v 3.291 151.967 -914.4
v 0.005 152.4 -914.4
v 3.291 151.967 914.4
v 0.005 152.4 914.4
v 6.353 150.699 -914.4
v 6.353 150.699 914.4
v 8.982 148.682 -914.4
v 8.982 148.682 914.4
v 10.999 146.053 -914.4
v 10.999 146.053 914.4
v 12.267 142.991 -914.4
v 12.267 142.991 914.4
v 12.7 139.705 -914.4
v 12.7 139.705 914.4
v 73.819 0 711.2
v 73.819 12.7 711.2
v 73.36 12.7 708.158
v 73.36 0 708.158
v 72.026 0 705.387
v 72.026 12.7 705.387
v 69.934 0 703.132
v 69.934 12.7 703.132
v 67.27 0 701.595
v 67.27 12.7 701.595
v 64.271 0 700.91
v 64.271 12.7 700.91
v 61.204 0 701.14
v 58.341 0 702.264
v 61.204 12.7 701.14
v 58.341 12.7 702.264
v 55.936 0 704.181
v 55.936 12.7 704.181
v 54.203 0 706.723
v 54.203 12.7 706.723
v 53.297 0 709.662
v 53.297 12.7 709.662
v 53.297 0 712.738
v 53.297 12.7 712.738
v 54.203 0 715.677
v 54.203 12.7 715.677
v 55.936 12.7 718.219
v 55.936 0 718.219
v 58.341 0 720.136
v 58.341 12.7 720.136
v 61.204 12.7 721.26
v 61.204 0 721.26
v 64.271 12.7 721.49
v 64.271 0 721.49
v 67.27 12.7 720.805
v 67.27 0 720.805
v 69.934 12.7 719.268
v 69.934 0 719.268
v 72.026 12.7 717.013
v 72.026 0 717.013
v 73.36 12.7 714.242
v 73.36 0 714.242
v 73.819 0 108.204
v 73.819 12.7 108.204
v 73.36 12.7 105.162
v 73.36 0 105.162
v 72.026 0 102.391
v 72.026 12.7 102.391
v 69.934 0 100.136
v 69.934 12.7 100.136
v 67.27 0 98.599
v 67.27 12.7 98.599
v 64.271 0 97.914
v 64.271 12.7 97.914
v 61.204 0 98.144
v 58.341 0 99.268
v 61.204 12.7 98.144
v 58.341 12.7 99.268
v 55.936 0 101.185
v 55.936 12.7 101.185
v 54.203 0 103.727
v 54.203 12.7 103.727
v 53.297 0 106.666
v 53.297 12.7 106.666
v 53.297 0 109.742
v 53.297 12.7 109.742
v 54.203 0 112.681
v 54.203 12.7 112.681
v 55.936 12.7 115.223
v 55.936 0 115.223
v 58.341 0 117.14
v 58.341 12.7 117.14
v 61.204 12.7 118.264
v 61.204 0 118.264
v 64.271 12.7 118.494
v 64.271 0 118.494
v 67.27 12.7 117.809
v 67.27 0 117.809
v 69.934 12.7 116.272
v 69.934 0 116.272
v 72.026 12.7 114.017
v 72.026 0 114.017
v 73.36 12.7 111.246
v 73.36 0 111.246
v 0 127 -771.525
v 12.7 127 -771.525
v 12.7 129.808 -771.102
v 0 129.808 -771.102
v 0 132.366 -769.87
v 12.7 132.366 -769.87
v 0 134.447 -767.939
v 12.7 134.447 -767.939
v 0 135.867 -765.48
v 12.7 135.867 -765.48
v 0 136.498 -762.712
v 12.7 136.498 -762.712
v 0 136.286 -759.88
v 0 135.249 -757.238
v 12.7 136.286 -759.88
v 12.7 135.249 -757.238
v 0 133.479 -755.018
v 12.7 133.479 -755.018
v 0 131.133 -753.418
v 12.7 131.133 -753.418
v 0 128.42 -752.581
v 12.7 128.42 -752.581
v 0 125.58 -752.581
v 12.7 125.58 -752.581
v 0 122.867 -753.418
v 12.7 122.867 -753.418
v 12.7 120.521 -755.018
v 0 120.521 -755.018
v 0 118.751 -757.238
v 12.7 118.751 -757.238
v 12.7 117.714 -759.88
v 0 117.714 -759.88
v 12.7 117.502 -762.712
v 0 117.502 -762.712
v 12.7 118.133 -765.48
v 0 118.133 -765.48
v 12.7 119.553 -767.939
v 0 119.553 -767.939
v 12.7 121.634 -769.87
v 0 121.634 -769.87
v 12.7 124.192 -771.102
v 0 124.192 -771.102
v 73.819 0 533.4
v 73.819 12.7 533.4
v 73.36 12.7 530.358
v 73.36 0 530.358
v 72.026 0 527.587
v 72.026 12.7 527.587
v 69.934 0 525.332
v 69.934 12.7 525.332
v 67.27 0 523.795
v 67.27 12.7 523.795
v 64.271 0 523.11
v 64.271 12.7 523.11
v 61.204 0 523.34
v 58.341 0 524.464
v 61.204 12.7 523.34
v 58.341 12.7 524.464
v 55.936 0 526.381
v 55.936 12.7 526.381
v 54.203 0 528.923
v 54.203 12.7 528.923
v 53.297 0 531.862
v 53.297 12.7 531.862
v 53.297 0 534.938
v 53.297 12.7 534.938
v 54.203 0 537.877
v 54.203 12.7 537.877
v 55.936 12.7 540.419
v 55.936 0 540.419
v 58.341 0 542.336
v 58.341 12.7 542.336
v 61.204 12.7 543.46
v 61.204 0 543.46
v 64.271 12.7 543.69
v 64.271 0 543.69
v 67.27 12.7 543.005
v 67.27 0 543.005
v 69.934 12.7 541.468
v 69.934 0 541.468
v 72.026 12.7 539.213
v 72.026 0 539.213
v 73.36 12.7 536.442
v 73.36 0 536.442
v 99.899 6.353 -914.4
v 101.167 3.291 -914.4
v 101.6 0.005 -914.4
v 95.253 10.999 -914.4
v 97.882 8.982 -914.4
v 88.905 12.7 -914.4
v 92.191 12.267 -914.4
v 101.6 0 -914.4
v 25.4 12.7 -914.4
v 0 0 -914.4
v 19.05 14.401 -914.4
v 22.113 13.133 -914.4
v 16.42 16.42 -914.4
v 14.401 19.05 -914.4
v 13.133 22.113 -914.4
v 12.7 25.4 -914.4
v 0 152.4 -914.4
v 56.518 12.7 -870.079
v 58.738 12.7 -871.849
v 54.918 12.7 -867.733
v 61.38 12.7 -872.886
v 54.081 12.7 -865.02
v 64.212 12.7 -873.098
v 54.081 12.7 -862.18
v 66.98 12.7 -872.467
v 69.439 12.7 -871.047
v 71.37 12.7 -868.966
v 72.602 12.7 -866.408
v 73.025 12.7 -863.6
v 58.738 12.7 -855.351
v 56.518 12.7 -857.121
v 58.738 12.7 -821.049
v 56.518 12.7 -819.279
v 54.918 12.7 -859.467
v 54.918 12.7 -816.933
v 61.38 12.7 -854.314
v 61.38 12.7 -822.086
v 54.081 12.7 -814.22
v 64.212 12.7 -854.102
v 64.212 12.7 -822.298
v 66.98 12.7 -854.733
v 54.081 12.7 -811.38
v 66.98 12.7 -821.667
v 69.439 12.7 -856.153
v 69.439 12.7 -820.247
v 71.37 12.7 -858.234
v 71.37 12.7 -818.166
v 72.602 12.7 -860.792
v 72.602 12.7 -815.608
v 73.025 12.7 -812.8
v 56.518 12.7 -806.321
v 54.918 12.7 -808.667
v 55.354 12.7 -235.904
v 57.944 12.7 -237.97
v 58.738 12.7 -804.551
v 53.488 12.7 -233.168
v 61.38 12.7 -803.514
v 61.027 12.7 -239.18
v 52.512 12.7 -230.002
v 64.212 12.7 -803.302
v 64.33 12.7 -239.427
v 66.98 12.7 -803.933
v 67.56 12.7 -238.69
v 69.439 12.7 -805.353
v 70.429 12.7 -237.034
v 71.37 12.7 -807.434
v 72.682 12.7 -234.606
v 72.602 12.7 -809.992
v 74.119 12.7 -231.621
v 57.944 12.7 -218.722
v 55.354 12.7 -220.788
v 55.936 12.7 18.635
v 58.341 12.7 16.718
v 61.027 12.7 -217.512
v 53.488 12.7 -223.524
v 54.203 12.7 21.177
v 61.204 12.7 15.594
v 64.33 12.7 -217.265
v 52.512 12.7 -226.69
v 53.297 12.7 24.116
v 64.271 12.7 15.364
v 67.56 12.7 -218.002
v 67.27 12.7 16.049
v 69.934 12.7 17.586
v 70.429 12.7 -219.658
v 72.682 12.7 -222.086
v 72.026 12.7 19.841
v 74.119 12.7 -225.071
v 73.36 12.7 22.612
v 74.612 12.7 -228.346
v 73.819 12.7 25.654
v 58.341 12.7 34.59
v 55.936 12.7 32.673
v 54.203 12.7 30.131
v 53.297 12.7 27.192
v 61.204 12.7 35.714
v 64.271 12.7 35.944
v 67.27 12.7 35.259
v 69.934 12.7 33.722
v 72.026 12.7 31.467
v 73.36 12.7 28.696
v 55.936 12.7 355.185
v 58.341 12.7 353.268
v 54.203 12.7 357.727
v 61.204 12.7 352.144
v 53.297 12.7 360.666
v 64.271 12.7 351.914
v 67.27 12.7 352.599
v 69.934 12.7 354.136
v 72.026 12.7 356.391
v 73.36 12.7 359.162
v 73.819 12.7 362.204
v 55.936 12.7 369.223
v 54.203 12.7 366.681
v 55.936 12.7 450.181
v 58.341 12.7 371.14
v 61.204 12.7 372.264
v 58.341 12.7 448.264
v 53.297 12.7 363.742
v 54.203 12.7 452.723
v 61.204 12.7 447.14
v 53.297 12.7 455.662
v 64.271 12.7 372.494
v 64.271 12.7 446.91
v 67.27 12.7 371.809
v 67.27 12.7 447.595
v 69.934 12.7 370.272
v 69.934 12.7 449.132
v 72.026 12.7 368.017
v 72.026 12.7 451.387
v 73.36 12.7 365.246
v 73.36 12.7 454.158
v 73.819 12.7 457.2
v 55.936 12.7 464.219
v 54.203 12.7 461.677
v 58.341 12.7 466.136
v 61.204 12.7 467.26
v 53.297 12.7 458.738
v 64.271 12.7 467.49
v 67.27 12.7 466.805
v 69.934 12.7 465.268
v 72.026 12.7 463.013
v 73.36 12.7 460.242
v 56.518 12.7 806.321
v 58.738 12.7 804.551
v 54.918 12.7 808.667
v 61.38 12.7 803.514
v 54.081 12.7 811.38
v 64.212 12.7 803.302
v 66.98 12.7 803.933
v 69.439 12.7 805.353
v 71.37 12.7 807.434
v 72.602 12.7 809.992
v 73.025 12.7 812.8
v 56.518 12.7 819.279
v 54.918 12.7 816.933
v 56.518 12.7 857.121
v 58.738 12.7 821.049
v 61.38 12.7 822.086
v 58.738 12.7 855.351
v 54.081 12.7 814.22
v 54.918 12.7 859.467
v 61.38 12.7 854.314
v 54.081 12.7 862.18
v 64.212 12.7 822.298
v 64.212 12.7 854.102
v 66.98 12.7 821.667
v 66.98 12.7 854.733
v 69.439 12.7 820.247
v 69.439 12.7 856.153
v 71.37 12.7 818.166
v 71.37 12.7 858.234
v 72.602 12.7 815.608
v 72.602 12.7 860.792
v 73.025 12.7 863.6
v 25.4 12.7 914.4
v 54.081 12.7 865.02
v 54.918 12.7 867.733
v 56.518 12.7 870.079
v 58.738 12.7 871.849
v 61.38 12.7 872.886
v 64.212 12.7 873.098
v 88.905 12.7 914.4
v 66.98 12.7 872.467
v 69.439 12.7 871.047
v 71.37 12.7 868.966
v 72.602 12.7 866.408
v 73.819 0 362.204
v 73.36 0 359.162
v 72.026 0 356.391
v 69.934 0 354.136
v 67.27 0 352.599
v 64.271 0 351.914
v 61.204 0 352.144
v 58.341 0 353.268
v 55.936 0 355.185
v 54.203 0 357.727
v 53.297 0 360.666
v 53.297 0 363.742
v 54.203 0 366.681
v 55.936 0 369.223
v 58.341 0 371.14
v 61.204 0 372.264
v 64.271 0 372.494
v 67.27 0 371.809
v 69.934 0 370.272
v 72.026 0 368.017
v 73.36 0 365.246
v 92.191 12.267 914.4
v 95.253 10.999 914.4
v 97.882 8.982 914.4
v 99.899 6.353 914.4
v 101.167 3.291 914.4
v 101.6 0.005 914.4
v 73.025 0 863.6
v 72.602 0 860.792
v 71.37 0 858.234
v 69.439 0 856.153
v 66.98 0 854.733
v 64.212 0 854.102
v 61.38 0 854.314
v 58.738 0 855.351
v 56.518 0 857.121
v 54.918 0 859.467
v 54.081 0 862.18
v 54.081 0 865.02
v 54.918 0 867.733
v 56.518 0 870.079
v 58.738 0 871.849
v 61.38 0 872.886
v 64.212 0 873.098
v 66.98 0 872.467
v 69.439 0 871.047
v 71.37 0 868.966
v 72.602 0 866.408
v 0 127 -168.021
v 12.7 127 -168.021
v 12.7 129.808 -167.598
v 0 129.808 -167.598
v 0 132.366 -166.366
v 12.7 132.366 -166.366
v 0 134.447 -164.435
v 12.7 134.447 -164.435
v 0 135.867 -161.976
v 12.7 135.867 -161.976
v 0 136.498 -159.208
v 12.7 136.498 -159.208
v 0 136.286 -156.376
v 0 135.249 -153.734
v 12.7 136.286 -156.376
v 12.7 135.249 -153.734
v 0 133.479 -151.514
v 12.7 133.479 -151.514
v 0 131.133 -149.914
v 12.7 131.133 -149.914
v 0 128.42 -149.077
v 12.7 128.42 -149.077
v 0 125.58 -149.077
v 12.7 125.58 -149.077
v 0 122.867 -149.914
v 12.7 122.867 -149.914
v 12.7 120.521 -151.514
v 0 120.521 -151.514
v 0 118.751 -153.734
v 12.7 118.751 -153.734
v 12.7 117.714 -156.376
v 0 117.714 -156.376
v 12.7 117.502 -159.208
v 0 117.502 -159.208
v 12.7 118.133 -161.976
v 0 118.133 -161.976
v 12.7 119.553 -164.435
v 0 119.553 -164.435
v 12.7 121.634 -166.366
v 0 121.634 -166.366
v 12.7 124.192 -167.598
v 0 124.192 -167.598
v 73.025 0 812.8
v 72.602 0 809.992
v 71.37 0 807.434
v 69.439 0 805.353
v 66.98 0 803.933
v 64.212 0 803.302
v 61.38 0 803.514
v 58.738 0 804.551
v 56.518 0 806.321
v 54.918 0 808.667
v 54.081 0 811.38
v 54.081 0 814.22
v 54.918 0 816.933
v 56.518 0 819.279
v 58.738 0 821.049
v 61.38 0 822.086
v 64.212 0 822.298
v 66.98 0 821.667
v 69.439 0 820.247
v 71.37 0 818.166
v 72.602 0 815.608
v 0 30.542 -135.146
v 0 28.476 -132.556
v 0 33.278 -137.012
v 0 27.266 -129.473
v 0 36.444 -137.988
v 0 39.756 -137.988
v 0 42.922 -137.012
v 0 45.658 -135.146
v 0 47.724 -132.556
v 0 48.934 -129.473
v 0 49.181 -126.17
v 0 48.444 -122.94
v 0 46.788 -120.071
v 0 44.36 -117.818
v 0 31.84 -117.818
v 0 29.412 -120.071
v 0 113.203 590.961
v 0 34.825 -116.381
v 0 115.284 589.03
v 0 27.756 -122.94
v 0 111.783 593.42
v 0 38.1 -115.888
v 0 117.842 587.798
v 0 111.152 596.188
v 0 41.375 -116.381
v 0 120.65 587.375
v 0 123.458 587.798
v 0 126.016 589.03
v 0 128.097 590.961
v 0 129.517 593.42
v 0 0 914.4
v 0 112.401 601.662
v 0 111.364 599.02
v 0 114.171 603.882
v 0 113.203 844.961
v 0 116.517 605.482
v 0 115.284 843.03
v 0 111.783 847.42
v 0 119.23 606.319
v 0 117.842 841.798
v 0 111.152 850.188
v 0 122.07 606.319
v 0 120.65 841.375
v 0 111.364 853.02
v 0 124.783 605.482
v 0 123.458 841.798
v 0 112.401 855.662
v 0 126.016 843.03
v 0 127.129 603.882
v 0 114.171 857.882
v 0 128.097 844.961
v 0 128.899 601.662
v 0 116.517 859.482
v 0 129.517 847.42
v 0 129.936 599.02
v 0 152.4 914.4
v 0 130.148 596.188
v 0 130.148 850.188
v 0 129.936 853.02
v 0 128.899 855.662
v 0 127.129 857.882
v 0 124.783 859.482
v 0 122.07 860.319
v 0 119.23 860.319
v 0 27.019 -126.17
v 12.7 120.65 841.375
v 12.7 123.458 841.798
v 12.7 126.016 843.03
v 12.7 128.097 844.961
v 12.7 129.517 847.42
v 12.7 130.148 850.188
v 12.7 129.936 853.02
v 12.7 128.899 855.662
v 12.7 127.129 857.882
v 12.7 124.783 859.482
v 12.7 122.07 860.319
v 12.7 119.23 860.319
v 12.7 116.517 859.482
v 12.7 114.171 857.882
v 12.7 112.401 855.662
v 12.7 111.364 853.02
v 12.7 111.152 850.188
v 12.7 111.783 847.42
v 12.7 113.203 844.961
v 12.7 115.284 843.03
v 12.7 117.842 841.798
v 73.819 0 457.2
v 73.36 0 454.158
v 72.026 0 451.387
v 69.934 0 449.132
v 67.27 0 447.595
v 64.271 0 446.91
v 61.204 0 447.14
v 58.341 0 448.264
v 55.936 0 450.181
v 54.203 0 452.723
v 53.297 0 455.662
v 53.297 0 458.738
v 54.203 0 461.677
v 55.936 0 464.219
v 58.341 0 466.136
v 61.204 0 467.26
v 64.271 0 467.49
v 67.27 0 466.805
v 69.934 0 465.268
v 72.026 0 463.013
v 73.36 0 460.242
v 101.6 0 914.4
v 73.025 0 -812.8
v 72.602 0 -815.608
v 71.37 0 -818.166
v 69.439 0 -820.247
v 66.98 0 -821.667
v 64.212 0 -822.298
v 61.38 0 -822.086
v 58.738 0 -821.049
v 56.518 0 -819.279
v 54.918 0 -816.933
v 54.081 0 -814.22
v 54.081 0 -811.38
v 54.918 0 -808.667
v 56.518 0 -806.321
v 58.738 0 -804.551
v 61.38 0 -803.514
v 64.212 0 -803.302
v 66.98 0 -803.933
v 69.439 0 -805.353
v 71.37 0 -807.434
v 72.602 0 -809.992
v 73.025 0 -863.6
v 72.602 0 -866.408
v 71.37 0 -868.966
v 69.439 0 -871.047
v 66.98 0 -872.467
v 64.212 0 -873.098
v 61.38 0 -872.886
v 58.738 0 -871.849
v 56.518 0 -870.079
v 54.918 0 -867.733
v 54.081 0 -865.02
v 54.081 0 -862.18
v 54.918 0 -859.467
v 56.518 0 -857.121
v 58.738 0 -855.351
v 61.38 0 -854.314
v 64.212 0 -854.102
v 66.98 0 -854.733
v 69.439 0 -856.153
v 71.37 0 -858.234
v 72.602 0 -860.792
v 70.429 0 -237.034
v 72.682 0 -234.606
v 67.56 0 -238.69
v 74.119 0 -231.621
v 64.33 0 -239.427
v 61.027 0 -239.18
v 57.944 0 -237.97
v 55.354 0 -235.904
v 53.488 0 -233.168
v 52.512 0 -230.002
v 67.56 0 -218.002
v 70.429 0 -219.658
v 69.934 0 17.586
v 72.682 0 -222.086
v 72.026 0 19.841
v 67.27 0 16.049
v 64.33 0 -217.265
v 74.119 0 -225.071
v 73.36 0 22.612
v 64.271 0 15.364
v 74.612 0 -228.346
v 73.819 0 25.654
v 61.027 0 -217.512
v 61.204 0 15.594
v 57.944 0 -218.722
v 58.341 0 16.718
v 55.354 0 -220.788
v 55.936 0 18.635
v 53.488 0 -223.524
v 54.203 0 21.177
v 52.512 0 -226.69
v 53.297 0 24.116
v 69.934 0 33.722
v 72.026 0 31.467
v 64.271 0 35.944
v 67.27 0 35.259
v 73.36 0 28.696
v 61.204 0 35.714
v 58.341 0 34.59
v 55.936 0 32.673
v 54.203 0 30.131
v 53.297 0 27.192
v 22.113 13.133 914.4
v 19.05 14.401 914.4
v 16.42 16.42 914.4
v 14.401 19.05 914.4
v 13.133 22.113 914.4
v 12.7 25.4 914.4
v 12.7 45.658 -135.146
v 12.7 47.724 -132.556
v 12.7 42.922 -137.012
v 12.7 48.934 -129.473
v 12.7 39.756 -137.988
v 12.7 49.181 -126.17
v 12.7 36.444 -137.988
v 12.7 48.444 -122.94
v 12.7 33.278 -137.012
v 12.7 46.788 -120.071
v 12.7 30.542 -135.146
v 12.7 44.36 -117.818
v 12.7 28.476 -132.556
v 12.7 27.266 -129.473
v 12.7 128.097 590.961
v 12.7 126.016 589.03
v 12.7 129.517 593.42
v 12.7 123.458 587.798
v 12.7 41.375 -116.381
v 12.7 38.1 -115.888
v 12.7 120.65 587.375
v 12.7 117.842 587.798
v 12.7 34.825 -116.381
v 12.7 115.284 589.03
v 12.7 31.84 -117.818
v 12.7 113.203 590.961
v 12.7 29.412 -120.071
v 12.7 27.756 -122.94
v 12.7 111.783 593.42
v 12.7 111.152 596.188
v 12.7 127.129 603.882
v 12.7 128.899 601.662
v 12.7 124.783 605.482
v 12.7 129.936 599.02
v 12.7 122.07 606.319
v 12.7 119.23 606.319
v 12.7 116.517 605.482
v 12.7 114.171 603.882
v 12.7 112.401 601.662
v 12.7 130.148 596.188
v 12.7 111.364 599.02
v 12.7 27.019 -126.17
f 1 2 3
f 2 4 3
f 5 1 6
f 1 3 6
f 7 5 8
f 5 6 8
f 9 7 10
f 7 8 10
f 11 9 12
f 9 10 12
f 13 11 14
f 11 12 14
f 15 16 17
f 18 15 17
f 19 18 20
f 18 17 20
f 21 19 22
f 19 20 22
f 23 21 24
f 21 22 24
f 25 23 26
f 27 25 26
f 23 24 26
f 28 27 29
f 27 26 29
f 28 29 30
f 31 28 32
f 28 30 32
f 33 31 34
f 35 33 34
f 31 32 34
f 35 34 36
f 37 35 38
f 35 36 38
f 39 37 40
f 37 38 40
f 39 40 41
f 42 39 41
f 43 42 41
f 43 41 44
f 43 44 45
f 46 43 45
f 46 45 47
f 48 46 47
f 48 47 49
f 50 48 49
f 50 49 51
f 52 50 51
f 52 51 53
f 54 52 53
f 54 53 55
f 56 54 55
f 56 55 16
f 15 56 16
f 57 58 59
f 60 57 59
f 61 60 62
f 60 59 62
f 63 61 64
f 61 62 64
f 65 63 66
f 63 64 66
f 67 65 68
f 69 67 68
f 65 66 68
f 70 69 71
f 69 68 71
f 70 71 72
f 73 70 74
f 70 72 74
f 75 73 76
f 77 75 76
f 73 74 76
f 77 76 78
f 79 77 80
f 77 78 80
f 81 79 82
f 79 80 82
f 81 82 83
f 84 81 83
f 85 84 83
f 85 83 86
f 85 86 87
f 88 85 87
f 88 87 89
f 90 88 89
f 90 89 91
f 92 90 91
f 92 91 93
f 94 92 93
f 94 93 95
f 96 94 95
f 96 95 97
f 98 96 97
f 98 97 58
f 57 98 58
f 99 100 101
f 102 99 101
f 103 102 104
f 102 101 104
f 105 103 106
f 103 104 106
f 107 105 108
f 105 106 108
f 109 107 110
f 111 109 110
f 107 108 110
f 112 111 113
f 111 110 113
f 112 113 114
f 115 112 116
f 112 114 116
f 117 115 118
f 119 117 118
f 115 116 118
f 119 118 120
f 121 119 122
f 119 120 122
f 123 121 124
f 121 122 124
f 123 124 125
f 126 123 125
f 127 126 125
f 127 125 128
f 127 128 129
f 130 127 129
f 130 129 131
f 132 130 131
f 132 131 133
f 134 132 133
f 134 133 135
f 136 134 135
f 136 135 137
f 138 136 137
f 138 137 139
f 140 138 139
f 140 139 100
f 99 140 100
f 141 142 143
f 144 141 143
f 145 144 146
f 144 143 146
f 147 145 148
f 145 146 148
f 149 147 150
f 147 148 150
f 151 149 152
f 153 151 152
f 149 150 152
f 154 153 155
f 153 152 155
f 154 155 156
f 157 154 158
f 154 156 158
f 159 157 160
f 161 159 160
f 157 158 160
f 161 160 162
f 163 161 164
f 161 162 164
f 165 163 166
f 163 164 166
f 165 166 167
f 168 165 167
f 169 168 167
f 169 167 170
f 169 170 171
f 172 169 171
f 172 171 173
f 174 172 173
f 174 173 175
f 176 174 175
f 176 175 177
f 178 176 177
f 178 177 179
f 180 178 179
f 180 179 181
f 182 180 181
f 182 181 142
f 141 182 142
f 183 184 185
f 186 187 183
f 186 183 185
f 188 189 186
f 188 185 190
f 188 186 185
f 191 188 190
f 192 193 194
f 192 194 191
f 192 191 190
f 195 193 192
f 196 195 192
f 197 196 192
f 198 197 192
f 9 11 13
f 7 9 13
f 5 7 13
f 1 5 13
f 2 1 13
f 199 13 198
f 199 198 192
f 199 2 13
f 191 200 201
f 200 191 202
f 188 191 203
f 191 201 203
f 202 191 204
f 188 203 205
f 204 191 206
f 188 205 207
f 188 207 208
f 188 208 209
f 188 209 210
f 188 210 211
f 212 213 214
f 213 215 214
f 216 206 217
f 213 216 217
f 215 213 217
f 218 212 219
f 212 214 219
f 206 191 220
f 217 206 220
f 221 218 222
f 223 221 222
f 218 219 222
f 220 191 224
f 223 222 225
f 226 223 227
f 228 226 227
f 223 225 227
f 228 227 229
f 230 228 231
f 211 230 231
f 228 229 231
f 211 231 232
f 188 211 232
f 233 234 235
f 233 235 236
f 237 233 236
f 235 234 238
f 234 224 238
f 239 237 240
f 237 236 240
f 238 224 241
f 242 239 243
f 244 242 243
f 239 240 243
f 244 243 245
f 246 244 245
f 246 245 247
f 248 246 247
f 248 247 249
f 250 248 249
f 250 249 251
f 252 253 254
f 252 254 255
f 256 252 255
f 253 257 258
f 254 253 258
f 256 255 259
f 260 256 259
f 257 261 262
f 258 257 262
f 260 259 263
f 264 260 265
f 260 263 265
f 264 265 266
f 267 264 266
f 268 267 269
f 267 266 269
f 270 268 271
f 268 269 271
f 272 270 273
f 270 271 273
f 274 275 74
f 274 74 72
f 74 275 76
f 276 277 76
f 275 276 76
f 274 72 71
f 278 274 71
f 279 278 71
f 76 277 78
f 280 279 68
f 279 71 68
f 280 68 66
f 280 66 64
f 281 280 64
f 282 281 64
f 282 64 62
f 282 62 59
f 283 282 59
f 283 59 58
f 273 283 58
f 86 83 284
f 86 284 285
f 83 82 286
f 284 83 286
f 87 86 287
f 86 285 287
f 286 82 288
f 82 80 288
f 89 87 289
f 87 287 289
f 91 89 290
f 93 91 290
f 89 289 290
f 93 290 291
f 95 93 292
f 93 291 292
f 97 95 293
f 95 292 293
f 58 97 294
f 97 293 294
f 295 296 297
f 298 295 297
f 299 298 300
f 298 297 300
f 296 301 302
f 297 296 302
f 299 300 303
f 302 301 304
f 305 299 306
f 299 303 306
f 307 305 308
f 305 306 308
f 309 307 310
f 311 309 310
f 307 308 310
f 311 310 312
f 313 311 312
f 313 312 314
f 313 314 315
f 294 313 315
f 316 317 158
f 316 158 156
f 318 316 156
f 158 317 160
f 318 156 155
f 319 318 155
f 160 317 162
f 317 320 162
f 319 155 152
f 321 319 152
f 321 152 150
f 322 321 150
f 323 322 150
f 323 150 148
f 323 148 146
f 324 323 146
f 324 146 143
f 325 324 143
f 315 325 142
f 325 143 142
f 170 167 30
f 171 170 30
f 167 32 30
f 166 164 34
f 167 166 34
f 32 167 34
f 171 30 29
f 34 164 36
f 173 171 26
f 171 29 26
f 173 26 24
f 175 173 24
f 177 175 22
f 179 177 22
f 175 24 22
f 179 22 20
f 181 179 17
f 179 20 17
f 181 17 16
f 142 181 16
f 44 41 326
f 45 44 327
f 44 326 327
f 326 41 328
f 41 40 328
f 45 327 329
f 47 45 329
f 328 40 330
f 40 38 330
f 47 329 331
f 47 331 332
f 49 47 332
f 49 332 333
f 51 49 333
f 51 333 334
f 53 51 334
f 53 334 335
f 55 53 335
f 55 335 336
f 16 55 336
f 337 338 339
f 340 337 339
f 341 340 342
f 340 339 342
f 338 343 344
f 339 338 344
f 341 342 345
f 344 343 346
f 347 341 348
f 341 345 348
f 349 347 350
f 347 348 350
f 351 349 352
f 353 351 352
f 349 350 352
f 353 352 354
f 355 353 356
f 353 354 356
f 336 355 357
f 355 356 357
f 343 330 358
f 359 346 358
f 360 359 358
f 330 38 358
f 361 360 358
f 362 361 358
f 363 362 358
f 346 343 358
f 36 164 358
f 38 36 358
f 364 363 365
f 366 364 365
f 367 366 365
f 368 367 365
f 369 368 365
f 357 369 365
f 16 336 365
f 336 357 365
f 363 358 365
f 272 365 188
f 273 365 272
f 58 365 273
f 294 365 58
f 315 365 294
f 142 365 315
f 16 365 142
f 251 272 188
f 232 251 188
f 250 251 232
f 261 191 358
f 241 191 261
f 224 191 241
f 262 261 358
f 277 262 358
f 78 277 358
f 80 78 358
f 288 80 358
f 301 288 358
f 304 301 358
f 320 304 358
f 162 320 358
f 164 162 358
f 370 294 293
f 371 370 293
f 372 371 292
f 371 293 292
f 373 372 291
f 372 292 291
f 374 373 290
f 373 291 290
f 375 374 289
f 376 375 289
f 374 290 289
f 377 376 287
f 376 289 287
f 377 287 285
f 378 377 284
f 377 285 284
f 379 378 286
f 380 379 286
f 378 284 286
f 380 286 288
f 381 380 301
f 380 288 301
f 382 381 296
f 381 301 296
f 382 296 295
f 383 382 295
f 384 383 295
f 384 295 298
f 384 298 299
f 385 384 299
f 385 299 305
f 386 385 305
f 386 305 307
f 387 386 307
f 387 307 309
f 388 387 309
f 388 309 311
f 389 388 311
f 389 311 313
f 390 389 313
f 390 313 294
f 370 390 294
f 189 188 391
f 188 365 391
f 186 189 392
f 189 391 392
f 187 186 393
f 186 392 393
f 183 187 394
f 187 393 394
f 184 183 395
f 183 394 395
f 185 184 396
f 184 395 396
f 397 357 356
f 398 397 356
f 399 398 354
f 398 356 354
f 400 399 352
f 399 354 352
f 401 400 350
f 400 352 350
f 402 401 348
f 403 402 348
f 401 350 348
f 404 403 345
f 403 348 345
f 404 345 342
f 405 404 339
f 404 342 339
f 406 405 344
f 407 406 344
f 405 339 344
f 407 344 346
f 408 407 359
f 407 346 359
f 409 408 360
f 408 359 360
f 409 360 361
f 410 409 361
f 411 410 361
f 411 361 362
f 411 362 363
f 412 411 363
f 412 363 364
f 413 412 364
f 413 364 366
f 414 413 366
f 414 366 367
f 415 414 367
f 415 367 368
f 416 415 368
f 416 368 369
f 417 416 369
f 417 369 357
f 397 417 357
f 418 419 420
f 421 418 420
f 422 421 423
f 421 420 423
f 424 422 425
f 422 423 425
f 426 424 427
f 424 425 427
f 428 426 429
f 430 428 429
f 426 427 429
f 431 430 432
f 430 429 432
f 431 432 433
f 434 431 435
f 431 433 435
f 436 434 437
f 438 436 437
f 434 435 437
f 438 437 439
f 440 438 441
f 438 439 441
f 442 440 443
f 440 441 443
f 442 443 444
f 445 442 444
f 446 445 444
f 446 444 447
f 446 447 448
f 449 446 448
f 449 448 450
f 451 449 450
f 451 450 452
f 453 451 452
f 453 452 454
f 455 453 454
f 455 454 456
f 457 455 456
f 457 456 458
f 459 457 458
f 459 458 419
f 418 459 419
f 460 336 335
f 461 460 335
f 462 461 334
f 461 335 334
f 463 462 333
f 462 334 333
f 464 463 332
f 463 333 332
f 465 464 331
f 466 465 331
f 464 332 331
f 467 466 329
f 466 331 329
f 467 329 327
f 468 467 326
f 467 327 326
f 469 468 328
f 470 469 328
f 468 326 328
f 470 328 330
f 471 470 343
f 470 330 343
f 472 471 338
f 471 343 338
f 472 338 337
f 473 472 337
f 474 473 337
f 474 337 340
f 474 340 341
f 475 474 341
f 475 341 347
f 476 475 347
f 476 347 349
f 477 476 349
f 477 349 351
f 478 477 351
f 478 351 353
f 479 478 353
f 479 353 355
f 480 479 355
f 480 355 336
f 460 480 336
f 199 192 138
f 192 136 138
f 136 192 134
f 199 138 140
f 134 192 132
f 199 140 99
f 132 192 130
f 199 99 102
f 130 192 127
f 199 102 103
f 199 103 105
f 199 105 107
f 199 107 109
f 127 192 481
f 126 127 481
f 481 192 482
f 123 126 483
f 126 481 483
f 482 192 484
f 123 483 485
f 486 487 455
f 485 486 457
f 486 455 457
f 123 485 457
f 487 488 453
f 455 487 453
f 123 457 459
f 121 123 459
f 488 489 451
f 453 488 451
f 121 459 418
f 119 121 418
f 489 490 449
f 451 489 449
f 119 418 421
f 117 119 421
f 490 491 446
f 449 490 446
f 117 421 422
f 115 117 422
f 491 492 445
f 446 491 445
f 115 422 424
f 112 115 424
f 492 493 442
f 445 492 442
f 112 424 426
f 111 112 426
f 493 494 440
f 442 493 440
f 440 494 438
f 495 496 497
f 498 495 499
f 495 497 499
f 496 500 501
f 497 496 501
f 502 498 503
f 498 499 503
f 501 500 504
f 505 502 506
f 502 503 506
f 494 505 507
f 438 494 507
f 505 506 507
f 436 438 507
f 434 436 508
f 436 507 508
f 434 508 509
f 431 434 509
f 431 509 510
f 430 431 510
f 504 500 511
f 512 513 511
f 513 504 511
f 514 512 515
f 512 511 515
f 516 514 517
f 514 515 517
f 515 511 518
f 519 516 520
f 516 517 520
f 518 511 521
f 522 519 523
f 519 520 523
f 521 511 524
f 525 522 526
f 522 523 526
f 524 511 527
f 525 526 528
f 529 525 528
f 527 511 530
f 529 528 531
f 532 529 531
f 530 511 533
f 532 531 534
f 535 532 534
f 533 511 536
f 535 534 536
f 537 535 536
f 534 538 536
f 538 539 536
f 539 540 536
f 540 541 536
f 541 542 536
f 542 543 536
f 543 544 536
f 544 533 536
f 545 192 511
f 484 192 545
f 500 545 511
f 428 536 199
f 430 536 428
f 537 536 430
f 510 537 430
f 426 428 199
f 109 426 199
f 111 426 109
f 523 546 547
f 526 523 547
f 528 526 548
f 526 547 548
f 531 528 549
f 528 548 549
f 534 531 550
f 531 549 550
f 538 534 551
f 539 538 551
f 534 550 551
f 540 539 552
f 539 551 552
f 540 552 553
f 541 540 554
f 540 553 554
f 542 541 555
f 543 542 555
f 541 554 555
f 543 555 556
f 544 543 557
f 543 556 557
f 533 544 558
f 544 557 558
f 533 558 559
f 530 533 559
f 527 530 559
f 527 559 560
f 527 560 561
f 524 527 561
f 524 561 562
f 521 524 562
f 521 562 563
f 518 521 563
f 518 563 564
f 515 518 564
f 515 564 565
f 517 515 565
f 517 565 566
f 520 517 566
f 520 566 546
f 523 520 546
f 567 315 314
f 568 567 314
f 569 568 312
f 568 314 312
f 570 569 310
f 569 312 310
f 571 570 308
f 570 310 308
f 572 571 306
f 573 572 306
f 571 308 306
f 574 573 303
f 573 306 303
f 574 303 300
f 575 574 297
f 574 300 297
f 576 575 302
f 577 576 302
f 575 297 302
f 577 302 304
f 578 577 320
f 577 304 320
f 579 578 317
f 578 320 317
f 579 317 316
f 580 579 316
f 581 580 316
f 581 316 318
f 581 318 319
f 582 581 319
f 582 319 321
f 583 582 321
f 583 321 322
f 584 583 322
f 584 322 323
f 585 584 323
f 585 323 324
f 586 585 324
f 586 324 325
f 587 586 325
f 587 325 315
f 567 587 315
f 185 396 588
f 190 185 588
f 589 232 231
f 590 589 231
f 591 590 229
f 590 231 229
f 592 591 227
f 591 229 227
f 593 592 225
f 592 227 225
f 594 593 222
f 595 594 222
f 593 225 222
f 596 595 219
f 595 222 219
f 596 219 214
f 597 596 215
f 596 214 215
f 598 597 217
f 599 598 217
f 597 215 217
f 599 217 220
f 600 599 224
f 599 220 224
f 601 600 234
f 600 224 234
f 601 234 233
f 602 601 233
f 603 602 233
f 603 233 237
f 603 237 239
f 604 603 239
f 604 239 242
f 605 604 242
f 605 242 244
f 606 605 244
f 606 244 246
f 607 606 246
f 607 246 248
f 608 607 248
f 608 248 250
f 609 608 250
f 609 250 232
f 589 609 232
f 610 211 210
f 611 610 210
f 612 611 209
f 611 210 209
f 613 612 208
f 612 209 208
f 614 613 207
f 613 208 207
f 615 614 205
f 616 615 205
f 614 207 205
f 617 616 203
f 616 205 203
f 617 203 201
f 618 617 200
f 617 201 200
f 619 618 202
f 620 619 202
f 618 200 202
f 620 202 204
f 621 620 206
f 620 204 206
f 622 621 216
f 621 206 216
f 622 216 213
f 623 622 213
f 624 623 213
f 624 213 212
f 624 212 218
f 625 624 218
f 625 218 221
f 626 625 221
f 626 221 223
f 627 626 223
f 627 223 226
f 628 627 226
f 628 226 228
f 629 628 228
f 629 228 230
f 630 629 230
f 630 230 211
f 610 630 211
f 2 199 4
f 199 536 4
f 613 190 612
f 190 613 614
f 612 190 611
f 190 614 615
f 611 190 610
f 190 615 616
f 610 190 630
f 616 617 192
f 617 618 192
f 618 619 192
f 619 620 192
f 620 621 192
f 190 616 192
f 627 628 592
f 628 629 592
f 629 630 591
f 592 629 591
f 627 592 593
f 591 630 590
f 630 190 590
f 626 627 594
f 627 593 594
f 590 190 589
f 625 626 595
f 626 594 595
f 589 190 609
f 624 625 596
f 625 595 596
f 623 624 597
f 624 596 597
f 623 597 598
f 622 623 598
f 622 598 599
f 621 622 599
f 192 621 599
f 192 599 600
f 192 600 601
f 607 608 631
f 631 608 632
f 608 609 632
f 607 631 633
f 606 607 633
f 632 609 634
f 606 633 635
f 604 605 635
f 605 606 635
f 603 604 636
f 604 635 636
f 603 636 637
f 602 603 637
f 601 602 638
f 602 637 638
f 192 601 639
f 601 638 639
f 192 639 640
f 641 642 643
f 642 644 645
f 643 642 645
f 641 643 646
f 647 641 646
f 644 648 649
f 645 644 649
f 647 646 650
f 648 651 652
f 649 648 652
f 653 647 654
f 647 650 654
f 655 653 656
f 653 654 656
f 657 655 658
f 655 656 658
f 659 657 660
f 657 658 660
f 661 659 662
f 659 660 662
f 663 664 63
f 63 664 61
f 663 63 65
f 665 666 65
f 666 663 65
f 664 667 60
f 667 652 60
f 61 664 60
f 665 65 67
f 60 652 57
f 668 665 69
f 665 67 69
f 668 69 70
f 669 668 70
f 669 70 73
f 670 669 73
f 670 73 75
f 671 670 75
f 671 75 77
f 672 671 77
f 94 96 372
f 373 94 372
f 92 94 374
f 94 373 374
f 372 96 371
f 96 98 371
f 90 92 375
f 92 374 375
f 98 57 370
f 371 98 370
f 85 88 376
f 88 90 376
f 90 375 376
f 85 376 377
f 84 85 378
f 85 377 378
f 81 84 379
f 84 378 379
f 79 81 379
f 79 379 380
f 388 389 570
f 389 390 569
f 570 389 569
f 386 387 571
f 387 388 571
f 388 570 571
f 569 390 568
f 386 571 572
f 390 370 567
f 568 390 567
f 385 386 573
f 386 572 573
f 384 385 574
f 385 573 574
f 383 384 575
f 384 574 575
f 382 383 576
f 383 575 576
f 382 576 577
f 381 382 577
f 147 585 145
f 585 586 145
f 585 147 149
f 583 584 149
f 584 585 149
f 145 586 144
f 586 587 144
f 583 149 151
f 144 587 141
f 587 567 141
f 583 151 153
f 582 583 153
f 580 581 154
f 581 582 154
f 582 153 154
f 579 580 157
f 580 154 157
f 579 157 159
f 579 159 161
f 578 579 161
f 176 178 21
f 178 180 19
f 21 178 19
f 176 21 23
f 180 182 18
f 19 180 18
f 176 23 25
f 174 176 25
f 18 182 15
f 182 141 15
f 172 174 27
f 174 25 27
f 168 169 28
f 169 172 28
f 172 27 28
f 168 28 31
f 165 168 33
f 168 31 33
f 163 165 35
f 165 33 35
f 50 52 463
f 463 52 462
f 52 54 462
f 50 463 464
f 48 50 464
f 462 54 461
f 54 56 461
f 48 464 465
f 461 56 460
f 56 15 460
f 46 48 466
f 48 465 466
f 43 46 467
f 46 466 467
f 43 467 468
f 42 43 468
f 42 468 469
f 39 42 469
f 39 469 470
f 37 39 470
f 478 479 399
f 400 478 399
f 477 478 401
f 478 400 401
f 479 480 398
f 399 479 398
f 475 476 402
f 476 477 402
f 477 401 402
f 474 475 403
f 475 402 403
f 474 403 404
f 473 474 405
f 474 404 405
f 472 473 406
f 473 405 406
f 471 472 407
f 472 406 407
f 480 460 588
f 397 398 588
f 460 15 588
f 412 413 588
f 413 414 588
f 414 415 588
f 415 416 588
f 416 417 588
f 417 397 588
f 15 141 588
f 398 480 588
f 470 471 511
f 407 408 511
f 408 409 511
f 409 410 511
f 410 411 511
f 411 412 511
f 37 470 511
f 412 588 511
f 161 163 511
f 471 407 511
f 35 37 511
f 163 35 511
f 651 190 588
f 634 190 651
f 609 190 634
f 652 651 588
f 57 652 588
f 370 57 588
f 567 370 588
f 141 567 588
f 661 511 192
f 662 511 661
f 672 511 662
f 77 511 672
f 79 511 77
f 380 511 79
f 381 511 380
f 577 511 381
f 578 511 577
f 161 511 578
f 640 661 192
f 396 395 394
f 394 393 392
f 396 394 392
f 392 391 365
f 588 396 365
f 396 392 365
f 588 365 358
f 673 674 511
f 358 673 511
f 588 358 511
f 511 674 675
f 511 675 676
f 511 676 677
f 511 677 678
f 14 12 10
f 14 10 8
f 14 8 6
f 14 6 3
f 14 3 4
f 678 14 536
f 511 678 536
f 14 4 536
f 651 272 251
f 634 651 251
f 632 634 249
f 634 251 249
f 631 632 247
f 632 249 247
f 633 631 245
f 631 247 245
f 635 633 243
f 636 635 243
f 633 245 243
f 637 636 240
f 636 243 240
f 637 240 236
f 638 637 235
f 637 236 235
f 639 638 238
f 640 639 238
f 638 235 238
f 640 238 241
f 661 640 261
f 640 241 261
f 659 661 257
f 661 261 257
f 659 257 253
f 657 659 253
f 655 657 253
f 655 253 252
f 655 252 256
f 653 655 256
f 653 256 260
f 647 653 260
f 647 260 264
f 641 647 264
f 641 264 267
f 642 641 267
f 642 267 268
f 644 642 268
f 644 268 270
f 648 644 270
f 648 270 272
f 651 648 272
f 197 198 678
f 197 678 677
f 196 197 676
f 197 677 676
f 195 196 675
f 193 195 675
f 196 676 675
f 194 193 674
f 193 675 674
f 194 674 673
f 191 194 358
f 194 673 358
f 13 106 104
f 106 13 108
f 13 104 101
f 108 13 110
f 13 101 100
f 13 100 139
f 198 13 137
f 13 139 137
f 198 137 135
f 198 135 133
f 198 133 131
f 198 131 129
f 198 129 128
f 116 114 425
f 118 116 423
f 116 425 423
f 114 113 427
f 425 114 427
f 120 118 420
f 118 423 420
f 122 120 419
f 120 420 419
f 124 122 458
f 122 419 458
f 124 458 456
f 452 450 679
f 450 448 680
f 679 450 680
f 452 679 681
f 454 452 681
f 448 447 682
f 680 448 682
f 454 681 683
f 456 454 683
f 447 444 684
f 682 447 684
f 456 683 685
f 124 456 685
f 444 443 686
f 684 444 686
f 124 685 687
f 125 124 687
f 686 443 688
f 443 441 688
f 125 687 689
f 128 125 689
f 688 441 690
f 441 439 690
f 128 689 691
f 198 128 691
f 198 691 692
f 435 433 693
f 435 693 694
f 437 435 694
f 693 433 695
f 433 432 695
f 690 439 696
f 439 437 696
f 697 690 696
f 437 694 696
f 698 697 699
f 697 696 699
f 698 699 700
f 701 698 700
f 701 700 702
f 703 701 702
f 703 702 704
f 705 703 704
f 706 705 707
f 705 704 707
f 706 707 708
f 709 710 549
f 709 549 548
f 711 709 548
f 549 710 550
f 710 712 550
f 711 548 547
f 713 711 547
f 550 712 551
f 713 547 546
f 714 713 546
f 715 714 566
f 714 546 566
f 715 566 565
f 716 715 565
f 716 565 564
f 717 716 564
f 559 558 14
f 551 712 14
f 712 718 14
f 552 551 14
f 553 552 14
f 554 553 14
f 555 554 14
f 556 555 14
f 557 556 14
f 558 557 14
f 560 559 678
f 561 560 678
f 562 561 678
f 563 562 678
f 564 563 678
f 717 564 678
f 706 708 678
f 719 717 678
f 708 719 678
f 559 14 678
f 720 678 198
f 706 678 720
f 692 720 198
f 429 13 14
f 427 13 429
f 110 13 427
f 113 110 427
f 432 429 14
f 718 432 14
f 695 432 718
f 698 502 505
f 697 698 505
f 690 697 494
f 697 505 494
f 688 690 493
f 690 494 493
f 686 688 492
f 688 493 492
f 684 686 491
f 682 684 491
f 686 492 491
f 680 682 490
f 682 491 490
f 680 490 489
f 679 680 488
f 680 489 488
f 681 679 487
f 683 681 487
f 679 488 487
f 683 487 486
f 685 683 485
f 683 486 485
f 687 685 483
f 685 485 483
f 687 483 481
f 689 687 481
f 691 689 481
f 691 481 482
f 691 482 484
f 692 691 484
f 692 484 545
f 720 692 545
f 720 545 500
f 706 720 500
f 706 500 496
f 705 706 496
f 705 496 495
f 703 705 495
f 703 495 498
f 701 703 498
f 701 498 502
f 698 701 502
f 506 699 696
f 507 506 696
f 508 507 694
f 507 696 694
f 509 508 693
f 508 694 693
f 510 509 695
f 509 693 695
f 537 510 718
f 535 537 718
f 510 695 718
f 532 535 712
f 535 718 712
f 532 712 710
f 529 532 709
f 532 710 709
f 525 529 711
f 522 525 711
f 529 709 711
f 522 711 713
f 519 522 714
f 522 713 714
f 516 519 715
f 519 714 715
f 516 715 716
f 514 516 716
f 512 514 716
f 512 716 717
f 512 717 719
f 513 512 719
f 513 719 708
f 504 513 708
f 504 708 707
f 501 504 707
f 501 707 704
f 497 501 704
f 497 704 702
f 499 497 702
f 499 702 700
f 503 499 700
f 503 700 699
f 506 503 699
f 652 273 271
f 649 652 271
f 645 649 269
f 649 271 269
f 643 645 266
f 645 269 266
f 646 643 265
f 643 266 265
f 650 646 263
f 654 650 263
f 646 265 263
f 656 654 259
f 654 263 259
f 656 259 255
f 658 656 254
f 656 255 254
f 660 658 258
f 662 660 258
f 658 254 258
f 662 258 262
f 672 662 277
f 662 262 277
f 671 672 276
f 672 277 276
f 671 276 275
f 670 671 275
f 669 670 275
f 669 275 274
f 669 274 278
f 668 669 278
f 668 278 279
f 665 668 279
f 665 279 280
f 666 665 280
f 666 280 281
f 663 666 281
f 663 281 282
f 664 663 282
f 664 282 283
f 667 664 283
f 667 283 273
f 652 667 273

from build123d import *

# Parameters (mm, degrees)
BOSS_EXTRUDE1_DEPTH = 914.4
CUT_EXTRUDE2_REACH  = 14.7
SKETCH3_R           = 9.525
SKETCH3_R_2         = 10.31875
SKETCH3_R_3         = 11.1125
CUT_EXTRUDE3_REACH  = 14.7
SKETCH4_R           = 9.525
SKETCH5_R           = 11.1125
CUT_EXTRUDE4_DEPTH  = 102.6


with BuildPart() as part:
    # Sketch1 → Boss-Extrude1 (new body, symmetric)
    with BuildSketch(Plane.XY):
        with BuildLine():
            Line((0, 0), (0, 152.4))
            Line((0, 152.4), (0.00508, 152.4))
            ThreePointArc((0.00508, 152.4), (8.981744019, 148.681744019), (12.7, 139.70508))
            Line((12.7, 139.70508), (12.7, 25.4))
            ThreePointArc((12.7, 25.4), (16.419743879, 16.419743879), (25.4, 12.7))
            Line((25.4, 12.7), (88.90508, 12.7))
            ThreePointArc((88.90508, 12.7), (97.881744019, 8.981744019), (101.6, 0.00508))
            Line((101.6, 0.00508), (101.6, 0))
            Line((101.6, 0), (0, 0))
        make_face()
    extrude(amount=BOSS_EXTRUDE1_DEPTH, both=True)

    # Sketch3 → Cut-Extrude2 (cut, up to next)
    with BuildSketch(Plane(origin=(0, 12.7, 0), x_dir=(1, 0, 0), z_dir=(0, 1, 0)), mode=Mode.PRIVATE) as cut_extrude2_sk1:
        with Locations((63.5, -863.6)):
            Circle(SKETCH3_R)
    cut_extrude2_tool1 = extrude(cut_extrude2_sk1.sketch, amount=-CUT_EXTRUDE2_REACH, mode=Mode.PRIVATE) & part.part
    add(cut_extrude2_tool1.solids().sort_by_distance((63.5, 12.7, 863.6))[0], mode=Mode.SUBTRACT)
    # Sketch3 → Cut-Extrude2 (cut, up to next)
    with BuildSketch(Plane(origin=(0, 12.7, 0), x_dir=(1, 0, 0), z_dir=(0, 1, 0)), mode=Mode.PRIVATE) as cut_extrude2_sk2:
        with Locations((63.5, 863.6)):
            Circle(SKETCH3_R)
    cut_extrude2_tool2 = extrude(cut_extrude2_sk2.sketch, amount=-CUT_EXTRUDE2_REACH, mode=Mode.PRIVATE) & part.part
    add(cut_extrude2_tool2.solids().sort_by_distance((63.5, 12.7, -863.6))[0], mode=Mode.SUBTRACT)
    # Sketch3 → Cut-Extrude2 (cut, up to next)
    with BuildSketch(Plane(origin=(0, 12.7, 0), x_dir=(1, 0, 0), z_dir=(0, 1, 0)), mode=Mode.PRIVATE) as cut_extrude2_sk3:
        with Locations((63.5, -711.2)):
            Circle(SKETCH3_R_2)
    cut_extrude2_tool3 = extrude(cut_extrude2_sk3.sketch, amount=-CUT_EXTRUDE2_REACH, mode=Mode.PRIVATE) & part.part
    add(cut_extrude2_tool3.solids().sort_by_distance((63.5, 12.7, 711.2))[0], mode=Mode.SUBTRACT)
    # Sketch3 → Cut-Extrude2 (cut, up to next)
    with BuildSketch(Plane(origin=(0, 12.7, 0), x_dir=(1, 0, 0), z_dir=(0, 1, 0)), mode=Mode.PRIVATE) as cut_extrude2_sk4:
        with Locations((63.5, -457.2)):
            Circle(SKETCH3_R_2)
    cut_extrude2_tool4 = extrude(cut_extrude2_sk4.sketch, amount=-CUT_EXTRUDE2_REACH, mode=Mode.PRIVATE) & part.part
    add(cut_extrude2_tool4.solids().sort_by_distance((63.5, 12.7, 457.2))[0], mode=Mode.SUBTRACT)
    # Sketch3 → Cut-Extrude2 (cut, up to next)
    with BuildSketch(Plane(origin=(0, 12.7, 0), x_dir=(1, 0, 0), z_dir=(0, 1, 0)), mode=Mode.PRIVATE) as cut_extrude2_sk5:
        with Locations((63.5, -108.204)):
            Circle(SKETCH3_R_2)
    cut_extrude2_tool5 = extrude(cut_extrude2_sk5.sketch, amount=-CUT_EXTRUDE2_REACH, mode=Mode.PRIVATE) & part.part
    add(cut_extrude2_tool5.solids().sort_by_distance((63.5, 12.7, 108.204))[0], mode=Mode.SUBTRACT)
    # Sketch3 → Cut-Extrude2 (cut, up to next)
    with BuildSketch(Plane(origin=(0, 12.7, 0), x_dir=(1, 0, 0), z_dir=(0, 1, 0)), mode=Mode.PRIVATE) as cut_extrude2_sk6:
        with Locations((63.5, -533.4)):
            Circle(SKETCH3_R_2)
    cut_extrude2_tool6 = extrude(cut_extrude2_sk6.sketch, amount=-CUT_EXTRUDE2_REACH, mode=Mode.PRIVATE) & part.part
    add(cut_extrude2_tool6.solids().sort_by_distance((63.5, 12.7, 533.4))[0], mode=Mode.SUBTRACT)
    # Sketch3 → Cut-Extrude2 (cut, up to next)
    with BuildSketch(Plane(origin=(0, 12.7, 0), x_dir=(1, 0, 0), z_dir=(0, 1, 0)), mode=Mode.PRIVATE) as cut_extrude2_sk7:
        with Locations((63.5, -25.654)):
            Circle(SKETCH3_R_2)
    cut_extrude2_tool7 = extrude(cut_extrude2_sk7.sketch, amount=-CUT_EXTRUDE2_REACH, mode=Mode.PRIVATE) & part.part
    add(cut_extrude2_tool7.solids().sort_by_distance((63.5, 12.7, 25.654))[0], mode=Mode.SUBTRACT)
    # Sketch3 → Cut-Extrude2 (cut, up to next)
    with BuildSketch(Plane(origin=(0, 12.7, 0), x_dir=(1, 0, 0), z_dir=(0, 1, 0)), mode=Mode.PRIVATE) as cut_extrude2_sk8:
        with Locations((63.5, 228.346)):
            Circle(SKETCH3_R_3)
    cut_extrude2_tool8 = extrude(cut_extrude2_sk8.sketch, amount=-CUT_EXTRUDE2_REACH, mode=Mode.PRIVATE) & part.part
    add(cut_extrude2_tool8.solids().sort_by_distance((63.5, 12.7, -228.346))[0], mode=Mode.SUBTRACT)
    # Sketch3 → Cut-Extrude2 (cut, up to next)
    with BuildSketch(Plane(origin=(0, 12.7, 0), x_dir=(1, 0, 0), z_dir=(0, 1, 0)), mode=Mode.PRIVATE) as cut_extrude2_sk9:
        with Locations((63.5, -362.204)):
            Circle(SKETCH3_R_2)
    cut_extrude2_tool9 = extrude(cut_extrude2_sk9.sketch, amount=-CUT_EXTRUDE2_REACH, mode=Mode.PRIVATE) & part.part
    add(cut_extrude2_tool9.solids().sort_by_distance((63.5, 12.7, 362.204))[0], mode=Mode.SUBTRACT)
    # Sketch3 → Cut-Extrude2 (cut, up to next)
    with BuildSketch(Plane(origin=(0, 12.7, 0), x_dir=(1, 0, 0), z_dir=(0, 1, 0)), mode=Mode.PRIVATE) as cut_extrude2_sk10:
        with Locations((63.5, 812.8)):
            Circle(SKETCH3_R)
    cut_extrude2_tool10 = extrude(cut_extrude2_sk10.sketch, amount=-CUT_EXTRUDE2_REACH, mode=Mode.PRIVATE) & part.part
    add(cut_extrude2_tool10.solids().sort_by_distance((63.5, 12.7, -812.8))[0], mode=Mode.SUBTRACT)
    # Sketch3 → Cut-Extrude2 (cut, up to next)
    with BuildSketch(Plane(origin=(0, 12.7, 0), x_dir=(1, 0, 0), z_dir=(0, 1, 0)), mode=Mode.PRIVATE) as cut_extrude2_sk11:
        with Locations((63.5, -812.8)):
            Circle(SKETCH3_R)
    cut_extrude2_tool11 = extrude(cut_extrude2_sk11.sketch, amount=-CUT_EXTRUDE2_REACH, mode=Mode.PRIVATE) & part.part
    add(cut_extrude2_tool11.solids().sort_by_distance((63.5, 12.7, 812.8))[0], mode=Mode.SUBTRACT)

    # Sketch4 → Cut-Extrude3 (cut, up to next)
    with BuildSketch(Plane(origin=(12.7, 0, 0), x_dir=(0, 0, -1), z_dir=(1, 0, 0)), mode=Mode.PRIVATE) as cut_extrude3_sk1:
        with Locations((-850.9, 120.65)):
            Circle(SKETCH4_R)
    cut_extrude3_tool1 = extrude(cut_extrude3_sk1.sketch, amount=-CUT_EXTRUDE3_REACH, mode=Mode.PRIVATE) & part.part
    add(cut_extrude3_tool1.solids().sort_by_distance((12.7, 120.65, 850.9))[0], mode=Mode.SUBTRACT)
    # Sketch4 → Cut-Extrude3 (cut, up to next)
    with BuildSketch(Plane(origin=(12.7, 0, 0), x_dir=(0, 0, -1), z_dir=(1, 0, 0)), mode=Mode.PRIVATE) as cut_extrude3_sk2:
        with Locations((-596.9, 120.65)):
            Circle(SKETCH4_R)
    cut_extrude3_tool2 = extrude(cut_extrude3_sk2.sketch, amount=-CUT_EXTRUDE3_REACH, mode=Mode.PRIVATE) & part.part
    add(cut_extrude3_tool2.solids().sort_by_distance((12.7, 120.65, 596.9))[0], mode=Mode.SUBTRACT)
    # Sketch4 → Cut-Extrude3 (cut, up to next)
    with BuildSketch(Plane(origin=(12.7, 0, 0), x_dir=(0, 0, -1), z_dir=(1, 0, 0)), mode=Mode.PRIVATE) as cut_extrude3_sk3:
        with Locations((158.496, 127)):
            Circle(SKETCH4_R)
    cut_extrude3_tool3 = extrude(cut_extrude3_sk3.sketch, amount=-CUT_EXTRUDE3_REACH, mode=Mode.PRIVATE) & part.part
    add(cut_extrude3_tool3.solids().sort_by_distance((12.7, 127, -158.496))[0], mode=Mode.SUBTRACT)
    # Sketch4 → Cut-Extrude3 (cut, up to next)
    with BuildSketch(Plane(origin=(12.7, 0, 0), x_dir=(0, 0, -1), z_dir=(1, 0, 0)), mode=Mode.PRIVATE) as cut_extrude3_sk4:
        with Locations((762, 127)):
            Circle(SKETCH4_R)
    cut_extrude3_tool4 = extrude(cut_extrude3_sk4.sketch, amount=-CUT_EXTRUDE3_REACH, mode=Mode.PRIVATE) & part.part
    add(cut_extrude3_tool4.solids().sort_by_distance((12.7, 127, -762))[0], mode=Mode.SUBTRACT)

    # Sketch5 → Cut-Extrude4 (cut, through all)
    with BuildSketch(Plane.ZY):
        with Locations((-127, 38.1)):
            Circle(SKETCH5_R)
    extrude(amount=-CUT_EXTRUDE4_DEPTH, mode=Mode.SUBTRACT)


solid = part.part
